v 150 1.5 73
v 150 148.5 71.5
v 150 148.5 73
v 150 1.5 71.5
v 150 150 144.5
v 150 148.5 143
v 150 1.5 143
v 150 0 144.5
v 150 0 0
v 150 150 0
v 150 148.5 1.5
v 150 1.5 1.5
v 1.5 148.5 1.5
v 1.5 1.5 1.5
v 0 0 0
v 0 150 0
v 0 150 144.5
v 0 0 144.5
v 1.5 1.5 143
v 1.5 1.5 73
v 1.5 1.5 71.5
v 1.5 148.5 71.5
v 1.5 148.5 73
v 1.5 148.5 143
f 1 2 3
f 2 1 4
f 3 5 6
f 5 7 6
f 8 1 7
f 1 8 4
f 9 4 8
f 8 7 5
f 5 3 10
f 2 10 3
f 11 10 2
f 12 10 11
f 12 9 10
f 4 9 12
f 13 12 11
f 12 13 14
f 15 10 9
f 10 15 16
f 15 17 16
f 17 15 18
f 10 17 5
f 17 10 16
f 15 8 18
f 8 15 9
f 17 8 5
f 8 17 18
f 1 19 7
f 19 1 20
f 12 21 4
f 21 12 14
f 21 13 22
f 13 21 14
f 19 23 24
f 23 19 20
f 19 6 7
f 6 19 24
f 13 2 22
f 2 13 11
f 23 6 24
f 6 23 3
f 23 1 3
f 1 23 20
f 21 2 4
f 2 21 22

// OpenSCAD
thickness = 1.5;
layerLenght = 70;//层高
xLenght = 150;
yLenght = 150;
zLenght = layerLenght * 2 + thickness * 3;
cube([xLenght, yLenght, thickness]);
cube([xLenght, thickness, zLenght]);
cube([thickness, yLenght, zLenght]);

translate([0, 0, zLenght - thickness]) {
    cube([xLenght, yLenght, thickness]);
}
translate([0, yLenght - thickness, 0]) {
    cube([xLenght, thickness, zLenght]);
}

translate([0, 0, layerLenght + thickness]) {
    cube([xLenght, yLenght, thickness]);
}
